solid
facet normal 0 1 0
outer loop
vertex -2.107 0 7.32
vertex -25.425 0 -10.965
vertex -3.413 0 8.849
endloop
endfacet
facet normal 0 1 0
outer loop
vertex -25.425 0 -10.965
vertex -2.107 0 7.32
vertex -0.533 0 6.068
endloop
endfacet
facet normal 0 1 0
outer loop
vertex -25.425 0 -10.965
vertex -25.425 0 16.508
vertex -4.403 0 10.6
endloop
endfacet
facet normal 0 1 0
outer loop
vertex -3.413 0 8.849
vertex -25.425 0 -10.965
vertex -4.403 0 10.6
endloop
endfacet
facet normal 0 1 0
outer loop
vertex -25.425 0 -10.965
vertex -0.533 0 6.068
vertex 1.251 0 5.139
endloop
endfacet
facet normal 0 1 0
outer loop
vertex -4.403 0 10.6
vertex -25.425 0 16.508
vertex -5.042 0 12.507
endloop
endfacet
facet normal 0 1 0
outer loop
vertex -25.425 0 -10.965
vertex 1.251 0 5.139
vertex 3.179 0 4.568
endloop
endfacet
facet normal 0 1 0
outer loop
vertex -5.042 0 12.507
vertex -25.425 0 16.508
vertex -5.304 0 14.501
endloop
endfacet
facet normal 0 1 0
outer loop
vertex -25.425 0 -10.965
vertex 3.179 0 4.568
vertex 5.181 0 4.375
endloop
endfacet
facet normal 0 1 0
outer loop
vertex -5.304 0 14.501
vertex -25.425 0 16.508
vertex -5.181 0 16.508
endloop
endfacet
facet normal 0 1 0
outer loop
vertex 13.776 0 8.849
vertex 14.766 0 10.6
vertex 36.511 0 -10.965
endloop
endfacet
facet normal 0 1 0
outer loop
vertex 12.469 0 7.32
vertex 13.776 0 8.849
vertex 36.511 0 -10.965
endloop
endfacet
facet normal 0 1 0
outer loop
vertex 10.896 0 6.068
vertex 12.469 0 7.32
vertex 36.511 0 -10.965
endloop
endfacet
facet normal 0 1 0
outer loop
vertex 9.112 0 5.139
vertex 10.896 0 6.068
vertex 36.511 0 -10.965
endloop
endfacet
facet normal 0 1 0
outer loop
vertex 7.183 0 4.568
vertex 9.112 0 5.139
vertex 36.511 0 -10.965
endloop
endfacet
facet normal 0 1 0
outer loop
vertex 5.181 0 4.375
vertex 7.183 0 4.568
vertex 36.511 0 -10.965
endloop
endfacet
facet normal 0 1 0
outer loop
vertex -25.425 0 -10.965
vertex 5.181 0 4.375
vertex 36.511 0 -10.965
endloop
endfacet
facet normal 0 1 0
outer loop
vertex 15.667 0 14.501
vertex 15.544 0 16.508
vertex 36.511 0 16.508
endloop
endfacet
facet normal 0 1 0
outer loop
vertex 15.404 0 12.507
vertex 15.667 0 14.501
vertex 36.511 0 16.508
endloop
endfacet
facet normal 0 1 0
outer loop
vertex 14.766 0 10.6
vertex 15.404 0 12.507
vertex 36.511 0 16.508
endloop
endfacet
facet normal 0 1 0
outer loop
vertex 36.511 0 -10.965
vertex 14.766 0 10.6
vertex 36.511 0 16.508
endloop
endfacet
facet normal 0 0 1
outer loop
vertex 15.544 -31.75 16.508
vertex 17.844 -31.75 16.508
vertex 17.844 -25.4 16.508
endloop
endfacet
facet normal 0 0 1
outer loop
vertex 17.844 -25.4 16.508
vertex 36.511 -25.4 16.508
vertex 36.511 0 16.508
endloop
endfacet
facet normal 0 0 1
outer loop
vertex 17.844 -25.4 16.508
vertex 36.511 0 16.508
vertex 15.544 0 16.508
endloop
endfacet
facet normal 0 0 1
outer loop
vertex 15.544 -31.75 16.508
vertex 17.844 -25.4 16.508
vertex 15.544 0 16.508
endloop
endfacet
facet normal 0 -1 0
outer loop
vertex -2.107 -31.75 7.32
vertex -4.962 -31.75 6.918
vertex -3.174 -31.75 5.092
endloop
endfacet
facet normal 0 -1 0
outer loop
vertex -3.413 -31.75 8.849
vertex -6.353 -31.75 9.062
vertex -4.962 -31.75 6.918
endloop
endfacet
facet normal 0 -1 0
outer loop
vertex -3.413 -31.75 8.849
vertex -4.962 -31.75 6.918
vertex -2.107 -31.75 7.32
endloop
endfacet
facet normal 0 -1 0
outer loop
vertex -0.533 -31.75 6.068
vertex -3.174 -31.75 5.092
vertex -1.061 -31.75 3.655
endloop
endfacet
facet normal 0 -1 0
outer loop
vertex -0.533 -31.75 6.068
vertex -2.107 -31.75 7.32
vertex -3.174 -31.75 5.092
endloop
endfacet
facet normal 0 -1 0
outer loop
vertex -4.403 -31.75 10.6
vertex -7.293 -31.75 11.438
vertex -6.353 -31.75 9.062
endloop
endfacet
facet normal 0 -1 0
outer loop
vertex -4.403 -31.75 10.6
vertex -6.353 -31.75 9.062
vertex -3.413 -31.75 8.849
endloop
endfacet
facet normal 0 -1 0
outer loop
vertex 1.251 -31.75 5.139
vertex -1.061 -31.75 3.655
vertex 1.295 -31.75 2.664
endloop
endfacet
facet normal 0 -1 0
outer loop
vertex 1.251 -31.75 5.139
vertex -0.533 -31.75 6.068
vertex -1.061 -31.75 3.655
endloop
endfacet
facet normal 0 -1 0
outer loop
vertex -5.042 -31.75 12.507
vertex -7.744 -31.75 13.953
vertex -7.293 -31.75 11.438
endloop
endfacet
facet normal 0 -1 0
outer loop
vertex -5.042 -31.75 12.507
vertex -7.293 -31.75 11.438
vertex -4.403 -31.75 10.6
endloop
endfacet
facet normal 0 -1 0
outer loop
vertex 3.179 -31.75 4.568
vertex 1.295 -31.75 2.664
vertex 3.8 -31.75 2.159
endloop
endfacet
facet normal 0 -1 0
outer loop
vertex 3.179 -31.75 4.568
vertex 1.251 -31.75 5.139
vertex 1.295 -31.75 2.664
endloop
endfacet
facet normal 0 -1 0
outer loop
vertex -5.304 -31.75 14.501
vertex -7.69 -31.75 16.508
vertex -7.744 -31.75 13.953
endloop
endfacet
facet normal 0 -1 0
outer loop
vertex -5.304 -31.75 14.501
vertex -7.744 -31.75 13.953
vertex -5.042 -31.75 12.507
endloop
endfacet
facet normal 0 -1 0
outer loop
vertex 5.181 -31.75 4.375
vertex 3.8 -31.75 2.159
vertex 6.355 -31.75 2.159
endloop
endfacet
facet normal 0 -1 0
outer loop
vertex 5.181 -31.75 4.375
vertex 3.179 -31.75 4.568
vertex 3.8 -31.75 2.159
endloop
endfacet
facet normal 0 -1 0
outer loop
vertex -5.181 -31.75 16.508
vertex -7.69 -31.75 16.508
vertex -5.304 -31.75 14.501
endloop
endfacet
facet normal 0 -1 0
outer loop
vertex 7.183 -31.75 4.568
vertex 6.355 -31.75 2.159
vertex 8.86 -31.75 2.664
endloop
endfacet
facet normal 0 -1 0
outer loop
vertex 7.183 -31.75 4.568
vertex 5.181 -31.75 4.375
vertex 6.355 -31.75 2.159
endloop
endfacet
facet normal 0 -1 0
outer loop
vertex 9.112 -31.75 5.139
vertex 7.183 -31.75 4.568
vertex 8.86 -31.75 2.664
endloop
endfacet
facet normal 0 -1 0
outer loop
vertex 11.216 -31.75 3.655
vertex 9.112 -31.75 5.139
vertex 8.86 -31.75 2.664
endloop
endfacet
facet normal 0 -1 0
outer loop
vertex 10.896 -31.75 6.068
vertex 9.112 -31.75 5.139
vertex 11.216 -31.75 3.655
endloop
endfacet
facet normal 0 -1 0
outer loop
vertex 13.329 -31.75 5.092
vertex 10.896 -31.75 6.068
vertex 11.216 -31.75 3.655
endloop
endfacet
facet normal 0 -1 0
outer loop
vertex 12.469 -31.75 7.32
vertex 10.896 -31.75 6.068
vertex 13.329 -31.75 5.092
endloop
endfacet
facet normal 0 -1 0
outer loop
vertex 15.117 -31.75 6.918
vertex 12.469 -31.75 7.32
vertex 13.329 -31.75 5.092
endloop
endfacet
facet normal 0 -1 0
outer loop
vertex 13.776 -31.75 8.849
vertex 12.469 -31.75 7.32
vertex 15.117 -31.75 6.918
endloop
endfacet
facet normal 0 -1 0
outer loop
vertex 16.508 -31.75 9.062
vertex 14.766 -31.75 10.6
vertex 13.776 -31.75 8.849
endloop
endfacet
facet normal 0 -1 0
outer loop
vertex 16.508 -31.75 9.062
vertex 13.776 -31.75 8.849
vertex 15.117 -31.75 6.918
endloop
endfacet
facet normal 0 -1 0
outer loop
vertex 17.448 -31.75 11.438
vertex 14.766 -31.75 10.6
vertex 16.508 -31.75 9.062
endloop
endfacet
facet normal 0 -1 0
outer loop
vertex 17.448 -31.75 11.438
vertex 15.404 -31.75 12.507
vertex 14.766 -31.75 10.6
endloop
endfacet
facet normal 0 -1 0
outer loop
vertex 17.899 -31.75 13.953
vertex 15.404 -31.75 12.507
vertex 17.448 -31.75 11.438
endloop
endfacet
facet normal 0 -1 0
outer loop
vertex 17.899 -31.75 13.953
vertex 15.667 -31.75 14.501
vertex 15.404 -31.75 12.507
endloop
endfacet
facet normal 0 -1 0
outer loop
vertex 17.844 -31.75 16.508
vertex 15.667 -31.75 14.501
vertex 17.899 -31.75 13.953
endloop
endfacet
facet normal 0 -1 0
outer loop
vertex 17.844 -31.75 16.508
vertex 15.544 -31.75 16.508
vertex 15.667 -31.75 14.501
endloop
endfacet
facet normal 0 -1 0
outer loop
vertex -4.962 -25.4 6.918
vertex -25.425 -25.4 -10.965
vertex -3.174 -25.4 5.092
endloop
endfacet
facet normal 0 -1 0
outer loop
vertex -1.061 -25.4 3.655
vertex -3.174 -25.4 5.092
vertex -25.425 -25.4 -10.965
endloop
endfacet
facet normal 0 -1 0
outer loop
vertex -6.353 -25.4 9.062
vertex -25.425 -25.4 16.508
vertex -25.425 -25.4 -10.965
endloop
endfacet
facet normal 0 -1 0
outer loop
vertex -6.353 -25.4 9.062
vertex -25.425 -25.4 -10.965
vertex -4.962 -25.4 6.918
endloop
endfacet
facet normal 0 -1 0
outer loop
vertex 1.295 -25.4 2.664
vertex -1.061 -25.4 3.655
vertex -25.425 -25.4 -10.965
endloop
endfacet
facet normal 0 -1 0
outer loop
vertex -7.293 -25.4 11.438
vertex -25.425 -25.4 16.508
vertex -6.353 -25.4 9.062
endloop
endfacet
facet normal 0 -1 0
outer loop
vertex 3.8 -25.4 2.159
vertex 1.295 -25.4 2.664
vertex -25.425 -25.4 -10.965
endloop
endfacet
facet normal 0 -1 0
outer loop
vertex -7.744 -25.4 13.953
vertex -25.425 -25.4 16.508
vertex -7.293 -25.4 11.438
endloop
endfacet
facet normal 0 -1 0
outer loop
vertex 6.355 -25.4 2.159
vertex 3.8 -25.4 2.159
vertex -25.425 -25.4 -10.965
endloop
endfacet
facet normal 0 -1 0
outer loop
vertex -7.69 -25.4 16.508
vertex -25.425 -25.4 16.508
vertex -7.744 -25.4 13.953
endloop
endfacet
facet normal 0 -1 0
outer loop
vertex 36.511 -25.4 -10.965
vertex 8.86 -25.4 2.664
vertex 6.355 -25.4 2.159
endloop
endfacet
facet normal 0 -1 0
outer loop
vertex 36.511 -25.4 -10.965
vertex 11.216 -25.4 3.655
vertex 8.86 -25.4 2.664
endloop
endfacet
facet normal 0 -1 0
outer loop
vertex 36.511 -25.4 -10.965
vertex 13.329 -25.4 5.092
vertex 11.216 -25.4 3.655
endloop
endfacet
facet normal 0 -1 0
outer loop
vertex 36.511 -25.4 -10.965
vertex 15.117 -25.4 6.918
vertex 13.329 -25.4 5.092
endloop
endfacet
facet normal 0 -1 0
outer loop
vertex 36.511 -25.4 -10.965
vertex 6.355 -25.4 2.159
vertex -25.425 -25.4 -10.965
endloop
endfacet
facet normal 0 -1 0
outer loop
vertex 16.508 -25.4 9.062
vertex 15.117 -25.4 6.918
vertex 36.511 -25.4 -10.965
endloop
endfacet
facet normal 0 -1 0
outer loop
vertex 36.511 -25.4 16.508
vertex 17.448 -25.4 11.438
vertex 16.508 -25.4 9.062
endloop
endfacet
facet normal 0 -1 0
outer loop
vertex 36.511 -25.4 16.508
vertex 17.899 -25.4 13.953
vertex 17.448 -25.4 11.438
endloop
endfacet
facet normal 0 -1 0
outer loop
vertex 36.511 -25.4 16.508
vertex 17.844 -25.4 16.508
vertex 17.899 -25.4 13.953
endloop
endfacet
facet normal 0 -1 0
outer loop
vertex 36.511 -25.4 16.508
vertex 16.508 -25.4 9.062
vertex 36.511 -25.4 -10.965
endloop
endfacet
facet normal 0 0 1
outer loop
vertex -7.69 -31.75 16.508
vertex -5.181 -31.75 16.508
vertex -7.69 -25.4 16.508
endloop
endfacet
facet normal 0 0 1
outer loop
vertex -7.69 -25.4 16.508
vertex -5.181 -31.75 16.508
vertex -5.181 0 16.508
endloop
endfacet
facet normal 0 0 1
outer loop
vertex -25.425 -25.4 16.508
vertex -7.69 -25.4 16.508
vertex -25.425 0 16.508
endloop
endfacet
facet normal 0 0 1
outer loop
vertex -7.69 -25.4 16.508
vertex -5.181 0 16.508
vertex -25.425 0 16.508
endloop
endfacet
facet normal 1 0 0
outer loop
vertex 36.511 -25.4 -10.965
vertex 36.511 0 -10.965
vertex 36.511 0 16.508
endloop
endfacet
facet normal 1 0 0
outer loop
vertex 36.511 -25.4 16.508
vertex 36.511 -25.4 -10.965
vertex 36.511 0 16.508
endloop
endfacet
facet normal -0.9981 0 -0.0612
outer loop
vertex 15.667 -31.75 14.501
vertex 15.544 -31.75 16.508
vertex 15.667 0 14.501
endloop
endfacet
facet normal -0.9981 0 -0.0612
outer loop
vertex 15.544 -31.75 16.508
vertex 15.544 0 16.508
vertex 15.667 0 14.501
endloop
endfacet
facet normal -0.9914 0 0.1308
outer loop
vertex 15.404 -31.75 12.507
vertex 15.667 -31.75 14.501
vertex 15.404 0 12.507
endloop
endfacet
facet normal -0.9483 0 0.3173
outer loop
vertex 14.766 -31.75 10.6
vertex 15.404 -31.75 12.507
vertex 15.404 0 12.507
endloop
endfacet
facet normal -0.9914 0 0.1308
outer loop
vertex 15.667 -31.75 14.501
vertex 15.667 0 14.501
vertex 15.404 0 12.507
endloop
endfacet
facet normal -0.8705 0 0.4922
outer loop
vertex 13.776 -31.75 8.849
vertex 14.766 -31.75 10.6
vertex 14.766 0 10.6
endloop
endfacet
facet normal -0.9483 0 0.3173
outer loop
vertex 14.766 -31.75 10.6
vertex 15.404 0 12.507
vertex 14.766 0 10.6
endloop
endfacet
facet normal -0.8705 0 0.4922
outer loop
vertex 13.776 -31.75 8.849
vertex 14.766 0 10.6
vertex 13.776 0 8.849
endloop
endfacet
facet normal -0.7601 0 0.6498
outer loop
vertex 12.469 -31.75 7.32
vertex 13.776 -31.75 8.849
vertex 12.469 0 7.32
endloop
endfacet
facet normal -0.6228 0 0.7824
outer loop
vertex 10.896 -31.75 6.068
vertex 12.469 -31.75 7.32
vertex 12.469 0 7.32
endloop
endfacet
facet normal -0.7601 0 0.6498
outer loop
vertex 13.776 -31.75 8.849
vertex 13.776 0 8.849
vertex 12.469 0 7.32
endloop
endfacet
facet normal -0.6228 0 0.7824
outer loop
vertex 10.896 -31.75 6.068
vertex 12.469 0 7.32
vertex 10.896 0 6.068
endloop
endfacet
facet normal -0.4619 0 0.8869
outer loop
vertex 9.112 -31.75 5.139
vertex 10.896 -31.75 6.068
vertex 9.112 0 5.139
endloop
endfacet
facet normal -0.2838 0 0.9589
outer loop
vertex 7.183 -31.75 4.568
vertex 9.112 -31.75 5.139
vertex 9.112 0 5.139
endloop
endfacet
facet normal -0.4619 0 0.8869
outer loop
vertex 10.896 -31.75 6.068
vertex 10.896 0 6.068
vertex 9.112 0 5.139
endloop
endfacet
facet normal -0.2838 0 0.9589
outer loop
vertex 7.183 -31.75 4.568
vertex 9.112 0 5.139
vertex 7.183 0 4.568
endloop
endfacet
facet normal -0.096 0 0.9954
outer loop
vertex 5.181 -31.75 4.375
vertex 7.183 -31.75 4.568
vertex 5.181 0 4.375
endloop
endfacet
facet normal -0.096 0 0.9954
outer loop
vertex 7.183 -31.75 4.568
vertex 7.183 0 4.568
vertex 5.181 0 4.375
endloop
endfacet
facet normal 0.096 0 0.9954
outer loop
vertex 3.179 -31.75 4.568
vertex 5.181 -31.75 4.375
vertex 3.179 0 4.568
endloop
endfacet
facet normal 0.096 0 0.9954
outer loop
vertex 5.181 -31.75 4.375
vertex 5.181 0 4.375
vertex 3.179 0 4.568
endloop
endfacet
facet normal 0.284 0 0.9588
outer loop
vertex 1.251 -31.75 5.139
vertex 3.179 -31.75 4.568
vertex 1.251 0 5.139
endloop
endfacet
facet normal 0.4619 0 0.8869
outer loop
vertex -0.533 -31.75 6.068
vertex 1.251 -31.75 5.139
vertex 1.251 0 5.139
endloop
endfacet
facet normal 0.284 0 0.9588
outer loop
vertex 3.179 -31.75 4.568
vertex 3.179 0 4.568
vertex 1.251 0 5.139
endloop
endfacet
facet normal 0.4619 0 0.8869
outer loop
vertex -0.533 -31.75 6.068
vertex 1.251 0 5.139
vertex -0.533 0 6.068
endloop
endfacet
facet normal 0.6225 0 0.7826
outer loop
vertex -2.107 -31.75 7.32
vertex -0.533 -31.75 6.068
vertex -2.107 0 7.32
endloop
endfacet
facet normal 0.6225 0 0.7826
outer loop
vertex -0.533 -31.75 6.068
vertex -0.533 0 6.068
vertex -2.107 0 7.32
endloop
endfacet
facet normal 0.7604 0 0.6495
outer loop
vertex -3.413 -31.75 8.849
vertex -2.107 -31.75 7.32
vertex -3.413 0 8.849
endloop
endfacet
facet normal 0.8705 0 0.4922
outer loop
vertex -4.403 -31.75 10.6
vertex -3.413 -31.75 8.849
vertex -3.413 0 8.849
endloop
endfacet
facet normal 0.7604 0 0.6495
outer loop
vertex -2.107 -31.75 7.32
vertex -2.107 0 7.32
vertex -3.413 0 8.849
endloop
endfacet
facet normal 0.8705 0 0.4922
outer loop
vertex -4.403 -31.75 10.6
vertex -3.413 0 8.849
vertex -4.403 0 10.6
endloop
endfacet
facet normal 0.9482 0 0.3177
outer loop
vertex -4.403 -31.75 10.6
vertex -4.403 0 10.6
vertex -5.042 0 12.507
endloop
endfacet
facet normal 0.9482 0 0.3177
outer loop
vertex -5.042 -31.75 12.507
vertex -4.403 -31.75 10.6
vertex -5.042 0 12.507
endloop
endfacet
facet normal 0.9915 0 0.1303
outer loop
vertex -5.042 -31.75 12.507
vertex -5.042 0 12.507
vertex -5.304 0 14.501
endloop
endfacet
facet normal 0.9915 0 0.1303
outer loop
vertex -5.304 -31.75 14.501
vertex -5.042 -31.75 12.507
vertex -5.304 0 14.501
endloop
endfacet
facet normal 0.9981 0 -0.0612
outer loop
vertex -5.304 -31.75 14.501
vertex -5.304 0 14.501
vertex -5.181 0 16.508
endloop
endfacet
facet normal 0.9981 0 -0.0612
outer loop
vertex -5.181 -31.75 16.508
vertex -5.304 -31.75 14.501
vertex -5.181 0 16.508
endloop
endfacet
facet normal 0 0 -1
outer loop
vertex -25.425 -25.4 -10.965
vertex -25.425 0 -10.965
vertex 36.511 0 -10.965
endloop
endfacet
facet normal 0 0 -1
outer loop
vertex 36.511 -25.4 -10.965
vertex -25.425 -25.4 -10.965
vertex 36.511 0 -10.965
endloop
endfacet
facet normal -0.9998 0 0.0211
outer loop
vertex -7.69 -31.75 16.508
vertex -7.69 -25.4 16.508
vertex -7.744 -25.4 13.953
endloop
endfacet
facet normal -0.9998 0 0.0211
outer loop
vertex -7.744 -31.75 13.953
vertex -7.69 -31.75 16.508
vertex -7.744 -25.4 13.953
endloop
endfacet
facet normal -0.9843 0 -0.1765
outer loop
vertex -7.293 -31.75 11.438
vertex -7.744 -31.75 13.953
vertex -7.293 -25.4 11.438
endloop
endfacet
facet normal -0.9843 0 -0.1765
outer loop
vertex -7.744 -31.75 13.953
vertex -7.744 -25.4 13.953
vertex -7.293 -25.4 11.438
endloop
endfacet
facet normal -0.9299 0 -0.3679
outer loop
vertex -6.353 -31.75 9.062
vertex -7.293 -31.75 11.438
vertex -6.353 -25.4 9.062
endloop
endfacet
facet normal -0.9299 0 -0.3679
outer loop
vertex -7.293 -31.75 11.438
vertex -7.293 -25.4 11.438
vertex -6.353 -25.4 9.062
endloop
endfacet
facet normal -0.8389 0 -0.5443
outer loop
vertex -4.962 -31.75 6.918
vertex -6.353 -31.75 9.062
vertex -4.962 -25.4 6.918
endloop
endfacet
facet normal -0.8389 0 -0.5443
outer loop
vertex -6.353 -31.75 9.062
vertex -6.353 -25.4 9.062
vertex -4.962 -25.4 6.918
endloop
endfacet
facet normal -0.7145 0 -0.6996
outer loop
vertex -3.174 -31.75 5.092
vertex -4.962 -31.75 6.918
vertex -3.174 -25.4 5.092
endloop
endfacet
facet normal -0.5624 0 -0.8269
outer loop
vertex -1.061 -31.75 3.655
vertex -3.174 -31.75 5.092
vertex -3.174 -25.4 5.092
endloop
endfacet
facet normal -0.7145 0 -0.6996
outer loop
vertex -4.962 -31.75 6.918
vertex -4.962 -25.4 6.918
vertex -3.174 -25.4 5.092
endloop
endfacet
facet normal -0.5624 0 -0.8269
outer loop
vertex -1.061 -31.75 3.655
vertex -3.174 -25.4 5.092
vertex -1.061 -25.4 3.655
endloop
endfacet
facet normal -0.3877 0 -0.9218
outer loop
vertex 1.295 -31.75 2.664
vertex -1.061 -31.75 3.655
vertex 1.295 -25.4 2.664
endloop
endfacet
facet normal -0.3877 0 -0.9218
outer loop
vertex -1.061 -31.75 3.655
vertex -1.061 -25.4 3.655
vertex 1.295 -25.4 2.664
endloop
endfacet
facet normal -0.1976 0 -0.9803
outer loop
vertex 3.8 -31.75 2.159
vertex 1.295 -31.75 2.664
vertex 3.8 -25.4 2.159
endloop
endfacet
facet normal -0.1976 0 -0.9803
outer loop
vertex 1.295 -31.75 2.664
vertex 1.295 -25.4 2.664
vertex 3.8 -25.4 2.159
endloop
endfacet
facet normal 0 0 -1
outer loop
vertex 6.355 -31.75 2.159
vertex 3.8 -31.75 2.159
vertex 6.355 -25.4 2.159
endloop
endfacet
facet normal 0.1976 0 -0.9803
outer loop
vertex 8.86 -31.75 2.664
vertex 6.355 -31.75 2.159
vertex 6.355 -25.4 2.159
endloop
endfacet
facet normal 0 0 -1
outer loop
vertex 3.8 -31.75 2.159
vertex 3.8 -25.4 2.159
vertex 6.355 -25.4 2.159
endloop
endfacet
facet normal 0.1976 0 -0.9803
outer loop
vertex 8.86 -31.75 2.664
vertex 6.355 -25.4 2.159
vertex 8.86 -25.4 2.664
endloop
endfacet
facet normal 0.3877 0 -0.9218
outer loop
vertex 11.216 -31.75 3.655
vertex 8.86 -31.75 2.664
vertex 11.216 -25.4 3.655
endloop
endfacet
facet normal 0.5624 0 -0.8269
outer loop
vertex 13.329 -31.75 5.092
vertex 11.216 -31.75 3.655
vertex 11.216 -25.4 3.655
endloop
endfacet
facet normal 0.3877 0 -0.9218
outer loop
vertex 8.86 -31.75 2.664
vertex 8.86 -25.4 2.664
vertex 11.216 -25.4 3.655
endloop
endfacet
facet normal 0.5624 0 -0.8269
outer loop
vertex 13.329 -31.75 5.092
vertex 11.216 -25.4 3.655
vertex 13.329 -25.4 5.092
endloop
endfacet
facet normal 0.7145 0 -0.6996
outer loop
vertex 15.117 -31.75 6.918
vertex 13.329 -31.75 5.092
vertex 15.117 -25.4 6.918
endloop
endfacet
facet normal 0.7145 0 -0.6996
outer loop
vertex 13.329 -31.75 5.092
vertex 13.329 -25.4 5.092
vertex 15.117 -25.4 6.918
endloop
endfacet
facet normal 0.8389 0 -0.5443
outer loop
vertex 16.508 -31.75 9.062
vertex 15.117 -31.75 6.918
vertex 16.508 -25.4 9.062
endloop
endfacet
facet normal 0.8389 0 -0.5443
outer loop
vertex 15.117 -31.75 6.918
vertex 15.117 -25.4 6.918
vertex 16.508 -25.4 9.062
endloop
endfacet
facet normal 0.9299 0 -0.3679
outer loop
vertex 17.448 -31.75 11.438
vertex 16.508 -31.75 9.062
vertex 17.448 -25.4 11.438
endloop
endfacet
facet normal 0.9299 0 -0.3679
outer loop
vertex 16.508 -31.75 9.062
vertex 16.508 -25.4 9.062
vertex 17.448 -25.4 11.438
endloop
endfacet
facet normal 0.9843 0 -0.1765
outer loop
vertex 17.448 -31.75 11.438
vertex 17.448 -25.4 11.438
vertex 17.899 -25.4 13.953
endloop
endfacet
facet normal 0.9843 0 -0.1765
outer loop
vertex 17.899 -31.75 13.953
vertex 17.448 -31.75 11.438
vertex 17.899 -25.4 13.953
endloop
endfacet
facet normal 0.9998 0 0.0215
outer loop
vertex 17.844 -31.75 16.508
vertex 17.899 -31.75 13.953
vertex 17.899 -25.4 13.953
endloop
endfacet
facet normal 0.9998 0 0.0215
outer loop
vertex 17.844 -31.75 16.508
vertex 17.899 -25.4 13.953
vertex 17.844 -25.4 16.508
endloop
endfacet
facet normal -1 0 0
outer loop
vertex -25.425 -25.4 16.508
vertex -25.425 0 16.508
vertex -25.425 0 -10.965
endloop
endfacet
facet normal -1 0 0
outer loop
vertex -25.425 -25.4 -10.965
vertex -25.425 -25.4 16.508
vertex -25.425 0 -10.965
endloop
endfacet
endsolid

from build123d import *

# Parameters (mm, degrees)
F1_DEPTH = 25.4
F2_R     = 3.02283
F3_DEPTH = 25.4
F5_DEPTH = 6.35


with BuildPart() as f1:
    # F0 (on Front) → F1 (new body)
    with BuildSketch(Plane.XZ):
        with BuildLine():
            Line((-25.424864, 16.508088), (-25.424864, -10.965226))
            Line((-25.424864, -10.965226), (36.510594, -10.965226))
            Line((36.510594, -10.965226), (36.510594, 16.508088))
            Line((36.510594, 16.508088), (19.159023, 16.508088))
            ThreePointArc((19.159023, 16.508088), (5.422366, 0.842331), (-8.314291, 16.508088))
            Line((-8.314291, 16.508088), (-25.424864, 16.508088))
        make_face()
        with BuildLine():
            Line((-5.181369, 16.508088), (-8.314291, 16.508088))
            ThreePointArc((-8.314291, 16.508088), (5.422366, 0.842331), (19.159023, 16.508088))
            Line((19.159023, 16.508088), (15.544111, 16.508088))
            ThreePointArc((15.544111, 16.508088), (5.181371, 4.375351), (-5.181369, 16.508088))
        make_face()
    extrude(amount=F1_DEPTH)

    # F2 (on face) → F3 (join)
    with BuildSketch(Plane.XY.offset(16.508088)):
        with Locations((-15.827941, -12.417181)):
            Circle(F2_R)
    extrude(amount=-F3_DEPTH)

    # F4 (on face) → F5 (join)
    with BuildSketch(Plane.XZ.offset(25.4)):
        with BuildLine():
            ThreePointArc((-7.689733, 16.508088), (5.077277, 2.095446), (17.844288, 16.508088))
            Line((17.844288, 16.508088), (15.544111, 16.508088))
            ThreePointArc((15.544111, 16.508088), (5.181371, 4.375351), (-5.181369, 16.508088))
            Line((-5.181369, 16.508088), (-7.689733, 16.508088))
        make_face()
    extrude(amount=F5_DEPTH)


solid = f1.part
